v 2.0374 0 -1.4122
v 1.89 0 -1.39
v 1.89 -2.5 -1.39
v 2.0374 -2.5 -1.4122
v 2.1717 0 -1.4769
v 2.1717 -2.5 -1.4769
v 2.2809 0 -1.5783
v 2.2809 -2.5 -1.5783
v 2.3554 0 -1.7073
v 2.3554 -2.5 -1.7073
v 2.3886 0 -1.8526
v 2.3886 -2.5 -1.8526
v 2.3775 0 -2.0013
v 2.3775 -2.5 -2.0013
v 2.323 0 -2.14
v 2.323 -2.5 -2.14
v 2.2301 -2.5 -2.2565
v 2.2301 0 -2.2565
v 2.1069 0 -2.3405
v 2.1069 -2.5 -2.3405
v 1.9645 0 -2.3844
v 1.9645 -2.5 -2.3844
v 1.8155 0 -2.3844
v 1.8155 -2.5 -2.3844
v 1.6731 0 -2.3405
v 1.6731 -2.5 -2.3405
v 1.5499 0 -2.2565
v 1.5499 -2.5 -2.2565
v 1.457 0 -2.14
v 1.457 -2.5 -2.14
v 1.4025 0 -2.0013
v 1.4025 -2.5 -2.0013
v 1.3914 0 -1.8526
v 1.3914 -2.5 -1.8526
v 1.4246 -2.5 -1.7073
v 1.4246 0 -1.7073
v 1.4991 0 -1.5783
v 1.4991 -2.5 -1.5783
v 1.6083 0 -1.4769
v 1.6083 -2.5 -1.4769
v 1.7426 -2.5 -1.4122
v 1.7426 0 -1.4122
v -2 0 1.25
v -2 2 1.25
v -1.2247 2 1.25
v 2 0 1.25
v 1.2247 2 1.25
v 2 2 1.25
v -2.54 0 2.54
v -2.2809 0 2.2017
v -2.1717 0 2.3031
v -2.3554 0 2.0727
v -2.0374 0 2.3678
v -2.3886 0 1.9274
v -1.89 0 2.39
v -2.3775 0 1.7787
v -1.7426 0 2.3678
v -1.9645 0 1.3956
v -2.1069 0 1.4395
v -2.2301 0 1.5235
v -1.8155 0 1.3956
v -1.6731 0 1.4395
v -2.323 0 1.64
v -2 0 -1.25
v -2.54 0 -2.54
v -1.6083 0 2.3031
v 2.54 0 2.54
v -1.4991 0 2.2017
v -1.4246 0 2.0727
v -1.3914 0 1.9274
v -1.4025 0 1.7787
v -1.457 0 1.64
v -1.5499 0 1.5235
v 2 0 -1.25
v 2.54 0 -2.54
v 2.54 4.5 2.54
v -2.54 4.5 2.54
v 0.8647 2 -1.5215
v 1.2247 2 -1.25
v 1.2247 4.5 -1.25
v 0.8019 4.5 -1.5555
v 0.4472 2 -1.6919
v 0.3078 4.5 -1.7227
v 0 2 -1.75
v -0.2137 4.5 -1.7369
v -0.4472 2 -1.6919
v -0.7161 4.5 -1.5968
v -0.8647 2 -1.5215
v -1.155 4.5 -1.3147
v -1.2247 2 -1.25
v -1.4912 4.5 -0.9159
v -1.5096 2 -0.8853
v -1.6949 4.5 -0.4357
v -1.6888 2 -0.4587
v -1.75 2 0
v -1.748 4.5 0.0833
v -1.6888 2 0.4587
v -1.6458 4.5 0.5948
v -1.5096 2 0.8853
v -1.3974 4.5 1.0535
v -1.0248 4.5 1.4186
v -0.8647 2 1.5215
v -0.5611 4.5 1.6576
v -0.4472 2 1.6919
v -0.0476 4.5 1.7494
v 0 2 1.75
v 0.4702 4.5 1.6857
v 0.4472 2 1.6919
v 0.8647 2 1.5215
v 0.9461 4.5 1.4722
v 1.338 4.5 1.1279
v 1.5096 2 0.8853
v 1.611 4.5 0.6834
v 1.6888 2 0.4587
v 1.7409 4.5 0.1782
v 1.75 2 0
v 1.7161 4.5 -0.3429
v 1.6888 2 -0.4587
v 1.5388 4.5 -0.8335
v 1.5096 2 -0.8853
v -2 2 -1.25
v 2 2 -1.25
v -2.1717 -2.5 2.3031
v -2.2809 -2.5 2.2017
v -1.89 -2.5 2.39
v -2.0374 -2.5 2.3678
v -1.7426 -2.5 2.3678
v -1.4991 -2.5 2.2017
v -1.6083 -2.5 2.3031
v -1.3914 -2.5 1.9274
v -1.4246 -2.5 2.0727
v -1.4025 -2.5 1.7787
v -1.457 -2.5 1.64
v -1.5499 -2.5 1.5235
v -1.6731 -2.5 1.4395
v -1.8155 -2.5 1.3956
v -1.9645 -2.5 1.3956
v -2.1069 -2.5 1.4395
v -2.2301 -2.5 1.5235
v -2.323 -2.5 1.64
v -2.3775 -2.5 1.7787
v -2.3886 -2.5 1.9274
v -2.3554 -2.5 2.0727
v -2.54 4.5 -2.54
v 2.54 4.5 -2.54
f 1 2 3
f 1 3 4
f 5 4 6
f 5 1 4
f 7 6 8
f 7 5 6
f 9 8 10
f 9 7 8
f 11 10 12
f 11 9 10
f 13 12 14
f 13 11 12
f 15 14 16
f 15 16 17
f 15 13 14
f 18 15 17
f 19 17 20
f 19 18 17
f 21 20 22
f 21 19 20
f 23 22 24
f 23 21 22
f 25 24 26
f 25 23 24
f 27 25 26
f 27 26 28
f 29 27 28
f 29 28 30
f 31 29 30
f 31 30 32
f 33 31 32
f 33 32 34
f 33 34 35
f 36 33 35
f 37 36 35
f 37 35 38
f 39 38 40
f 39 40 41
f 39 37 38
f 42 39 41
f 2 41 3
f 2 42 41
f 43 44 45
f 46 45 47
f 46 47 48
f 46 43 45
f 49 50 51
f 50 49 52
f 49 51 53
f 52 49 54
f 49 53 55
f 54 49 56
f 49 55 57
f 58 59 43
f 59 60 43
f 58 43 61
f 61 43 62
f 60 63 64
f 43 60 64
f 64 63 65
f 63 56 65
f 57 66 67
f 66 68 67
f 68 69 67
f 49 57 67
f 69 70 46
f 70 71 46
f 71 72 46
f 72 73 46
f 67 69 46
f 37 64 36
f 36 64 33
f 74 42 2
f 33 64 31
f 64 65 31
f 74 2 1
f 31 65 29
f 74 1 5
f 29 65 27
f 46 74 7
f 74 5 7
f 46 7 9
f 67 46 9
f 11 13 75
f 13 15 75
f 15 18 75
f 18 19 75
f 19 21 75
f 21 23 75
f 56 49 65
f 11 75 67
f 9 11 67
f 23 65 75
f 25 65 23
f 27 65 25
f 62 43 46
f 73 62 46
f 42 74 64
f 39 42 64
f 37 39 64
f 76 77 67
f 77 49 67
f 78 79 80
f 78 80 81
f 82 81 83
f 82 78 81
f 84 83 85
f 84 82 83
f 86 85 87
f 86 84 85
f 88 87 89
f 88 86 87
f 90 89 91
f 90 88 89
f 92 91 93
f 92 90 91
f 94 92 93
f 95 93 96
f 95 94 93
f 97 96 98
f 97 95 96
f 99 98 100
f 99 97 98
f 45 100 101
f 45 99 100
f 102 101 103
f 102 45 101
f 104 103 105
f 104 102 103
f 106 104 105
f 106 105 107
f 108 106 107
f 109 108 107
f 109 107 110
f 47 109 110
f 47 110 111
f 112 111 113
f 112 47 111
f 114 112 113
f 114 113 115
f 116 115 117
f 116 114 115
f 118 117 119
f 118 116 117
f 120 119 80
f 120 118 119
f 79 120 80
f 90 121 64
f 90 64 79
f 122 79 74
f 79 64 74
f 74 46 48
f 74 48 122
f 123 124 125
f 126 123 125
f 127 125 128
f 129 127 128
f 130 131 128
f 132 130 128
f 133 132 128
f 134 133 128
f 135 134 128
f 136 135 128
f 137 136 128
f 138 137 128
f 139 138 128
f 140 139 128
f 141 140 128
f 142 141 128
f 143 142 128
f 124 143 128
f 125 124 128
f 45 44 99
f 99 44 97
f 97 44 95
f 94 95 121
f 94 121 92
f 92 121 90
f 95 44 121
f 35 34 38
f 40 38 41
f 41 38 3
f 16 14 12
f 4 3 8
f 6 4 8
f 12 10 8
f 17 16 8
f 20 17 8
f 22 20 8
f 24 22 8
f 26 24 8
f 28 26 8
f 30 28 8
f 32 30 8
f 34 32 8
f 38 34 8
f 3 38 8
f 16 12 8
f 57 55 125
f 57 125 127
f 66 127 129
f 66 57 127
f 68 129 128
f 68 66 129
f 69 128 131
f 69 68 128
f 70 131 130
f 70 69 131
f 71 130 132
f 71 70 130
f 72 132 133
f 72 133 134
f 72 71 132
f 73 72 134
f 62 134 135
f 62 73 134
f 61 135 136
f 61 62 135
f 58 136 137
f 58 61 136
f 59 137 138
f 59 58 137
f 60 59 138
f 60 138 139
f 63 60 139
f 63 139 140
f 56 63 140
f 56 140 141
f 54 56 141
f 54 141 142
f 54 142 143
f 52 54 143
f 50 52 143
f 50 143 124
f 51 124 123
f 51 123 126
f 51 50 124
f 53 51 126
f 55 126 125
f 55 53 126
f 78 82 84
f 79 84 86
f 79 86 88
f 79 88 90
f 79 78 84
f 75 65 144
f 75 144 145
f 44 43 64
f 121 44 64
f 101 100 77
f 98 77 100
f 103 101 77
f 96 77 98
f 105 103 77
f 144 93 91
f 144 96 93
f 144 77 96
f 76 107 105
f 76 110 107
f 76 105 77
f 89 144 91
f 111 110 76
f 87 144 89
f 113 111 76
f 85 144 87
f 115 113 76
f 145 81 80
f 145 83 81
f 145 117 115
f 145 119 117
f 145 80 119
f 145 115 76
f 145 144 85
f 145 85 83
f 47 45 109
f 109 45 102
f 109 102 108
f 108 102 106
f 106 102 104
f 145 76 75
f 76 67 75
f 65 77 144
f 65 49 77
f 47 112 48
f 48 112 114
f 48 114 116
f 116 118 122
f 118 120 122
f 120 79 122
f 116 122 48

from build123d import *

# Parameters (mm, degrees)
SKETCH1_W           = 5.08
SKETCH1_H           = 5.08
SKETCH1_W_2         = 4
SKETCH1_H_2         = 2.5
BOSS_EXTRUDE1_DEPTH = 2
SKETCH2_W           = 5.08
SKETCH2_H           = 5.08
SKETCH2_R           = 1.75
BOSS_EXTRUDE2_DEPTH = 2.5
SKETCH1_3_R         = 0.5
BOSS_EXTRUDE3_DEPTH = 2.5


with BuildPart() as part:
    # Sketch1 → Boss-Extrude1 (new body)
    with BuildSketch(Plane(origin=(0, 0, 0), x_dir=(1, 0, 0), z_dir=(0, 1, 0))):
        Rectangle(SKETCH1_W, SKETCH1_H)
        Rectangle(SKETCH1_W_2, SKETCH1_H_2, mode=Mode.SUBTRACT)
    extrude(amount=BOSS_EXTRUDE1_DEPTH)

    # Sketch2 → Boss-Extrude2 (add)
    with BuildSketch(Plane(origin=(0, 2, 0), x_dir=(1, 0, 0), z_dir=(0, 1, 0))):
        Rectangle(SKETCH2_W, SKETCH2_H)
        Circle(SKETCH2_R, mode=Mode.SUBTRACT)
    extrude(amount=BOSS_EXTRUDE2_DEPTH)

    # Sketch1<3> → Boss-Extrude3 (add)
    with BuildSketch(Plane(origin=(0, 0, 0), x_dir=(1, 0, 0), z_dir=(0, 1, 0))):
        with Locations((-1.89, -1.89)):
            Circle(SKETCH1_3_R)
        with Locations((1.89, 1.89)):
            Circle(SKETCH1_3_R)
    extrude(amount=-BOSS_EXTRUDE3_DEPTH)


solid = part.part
